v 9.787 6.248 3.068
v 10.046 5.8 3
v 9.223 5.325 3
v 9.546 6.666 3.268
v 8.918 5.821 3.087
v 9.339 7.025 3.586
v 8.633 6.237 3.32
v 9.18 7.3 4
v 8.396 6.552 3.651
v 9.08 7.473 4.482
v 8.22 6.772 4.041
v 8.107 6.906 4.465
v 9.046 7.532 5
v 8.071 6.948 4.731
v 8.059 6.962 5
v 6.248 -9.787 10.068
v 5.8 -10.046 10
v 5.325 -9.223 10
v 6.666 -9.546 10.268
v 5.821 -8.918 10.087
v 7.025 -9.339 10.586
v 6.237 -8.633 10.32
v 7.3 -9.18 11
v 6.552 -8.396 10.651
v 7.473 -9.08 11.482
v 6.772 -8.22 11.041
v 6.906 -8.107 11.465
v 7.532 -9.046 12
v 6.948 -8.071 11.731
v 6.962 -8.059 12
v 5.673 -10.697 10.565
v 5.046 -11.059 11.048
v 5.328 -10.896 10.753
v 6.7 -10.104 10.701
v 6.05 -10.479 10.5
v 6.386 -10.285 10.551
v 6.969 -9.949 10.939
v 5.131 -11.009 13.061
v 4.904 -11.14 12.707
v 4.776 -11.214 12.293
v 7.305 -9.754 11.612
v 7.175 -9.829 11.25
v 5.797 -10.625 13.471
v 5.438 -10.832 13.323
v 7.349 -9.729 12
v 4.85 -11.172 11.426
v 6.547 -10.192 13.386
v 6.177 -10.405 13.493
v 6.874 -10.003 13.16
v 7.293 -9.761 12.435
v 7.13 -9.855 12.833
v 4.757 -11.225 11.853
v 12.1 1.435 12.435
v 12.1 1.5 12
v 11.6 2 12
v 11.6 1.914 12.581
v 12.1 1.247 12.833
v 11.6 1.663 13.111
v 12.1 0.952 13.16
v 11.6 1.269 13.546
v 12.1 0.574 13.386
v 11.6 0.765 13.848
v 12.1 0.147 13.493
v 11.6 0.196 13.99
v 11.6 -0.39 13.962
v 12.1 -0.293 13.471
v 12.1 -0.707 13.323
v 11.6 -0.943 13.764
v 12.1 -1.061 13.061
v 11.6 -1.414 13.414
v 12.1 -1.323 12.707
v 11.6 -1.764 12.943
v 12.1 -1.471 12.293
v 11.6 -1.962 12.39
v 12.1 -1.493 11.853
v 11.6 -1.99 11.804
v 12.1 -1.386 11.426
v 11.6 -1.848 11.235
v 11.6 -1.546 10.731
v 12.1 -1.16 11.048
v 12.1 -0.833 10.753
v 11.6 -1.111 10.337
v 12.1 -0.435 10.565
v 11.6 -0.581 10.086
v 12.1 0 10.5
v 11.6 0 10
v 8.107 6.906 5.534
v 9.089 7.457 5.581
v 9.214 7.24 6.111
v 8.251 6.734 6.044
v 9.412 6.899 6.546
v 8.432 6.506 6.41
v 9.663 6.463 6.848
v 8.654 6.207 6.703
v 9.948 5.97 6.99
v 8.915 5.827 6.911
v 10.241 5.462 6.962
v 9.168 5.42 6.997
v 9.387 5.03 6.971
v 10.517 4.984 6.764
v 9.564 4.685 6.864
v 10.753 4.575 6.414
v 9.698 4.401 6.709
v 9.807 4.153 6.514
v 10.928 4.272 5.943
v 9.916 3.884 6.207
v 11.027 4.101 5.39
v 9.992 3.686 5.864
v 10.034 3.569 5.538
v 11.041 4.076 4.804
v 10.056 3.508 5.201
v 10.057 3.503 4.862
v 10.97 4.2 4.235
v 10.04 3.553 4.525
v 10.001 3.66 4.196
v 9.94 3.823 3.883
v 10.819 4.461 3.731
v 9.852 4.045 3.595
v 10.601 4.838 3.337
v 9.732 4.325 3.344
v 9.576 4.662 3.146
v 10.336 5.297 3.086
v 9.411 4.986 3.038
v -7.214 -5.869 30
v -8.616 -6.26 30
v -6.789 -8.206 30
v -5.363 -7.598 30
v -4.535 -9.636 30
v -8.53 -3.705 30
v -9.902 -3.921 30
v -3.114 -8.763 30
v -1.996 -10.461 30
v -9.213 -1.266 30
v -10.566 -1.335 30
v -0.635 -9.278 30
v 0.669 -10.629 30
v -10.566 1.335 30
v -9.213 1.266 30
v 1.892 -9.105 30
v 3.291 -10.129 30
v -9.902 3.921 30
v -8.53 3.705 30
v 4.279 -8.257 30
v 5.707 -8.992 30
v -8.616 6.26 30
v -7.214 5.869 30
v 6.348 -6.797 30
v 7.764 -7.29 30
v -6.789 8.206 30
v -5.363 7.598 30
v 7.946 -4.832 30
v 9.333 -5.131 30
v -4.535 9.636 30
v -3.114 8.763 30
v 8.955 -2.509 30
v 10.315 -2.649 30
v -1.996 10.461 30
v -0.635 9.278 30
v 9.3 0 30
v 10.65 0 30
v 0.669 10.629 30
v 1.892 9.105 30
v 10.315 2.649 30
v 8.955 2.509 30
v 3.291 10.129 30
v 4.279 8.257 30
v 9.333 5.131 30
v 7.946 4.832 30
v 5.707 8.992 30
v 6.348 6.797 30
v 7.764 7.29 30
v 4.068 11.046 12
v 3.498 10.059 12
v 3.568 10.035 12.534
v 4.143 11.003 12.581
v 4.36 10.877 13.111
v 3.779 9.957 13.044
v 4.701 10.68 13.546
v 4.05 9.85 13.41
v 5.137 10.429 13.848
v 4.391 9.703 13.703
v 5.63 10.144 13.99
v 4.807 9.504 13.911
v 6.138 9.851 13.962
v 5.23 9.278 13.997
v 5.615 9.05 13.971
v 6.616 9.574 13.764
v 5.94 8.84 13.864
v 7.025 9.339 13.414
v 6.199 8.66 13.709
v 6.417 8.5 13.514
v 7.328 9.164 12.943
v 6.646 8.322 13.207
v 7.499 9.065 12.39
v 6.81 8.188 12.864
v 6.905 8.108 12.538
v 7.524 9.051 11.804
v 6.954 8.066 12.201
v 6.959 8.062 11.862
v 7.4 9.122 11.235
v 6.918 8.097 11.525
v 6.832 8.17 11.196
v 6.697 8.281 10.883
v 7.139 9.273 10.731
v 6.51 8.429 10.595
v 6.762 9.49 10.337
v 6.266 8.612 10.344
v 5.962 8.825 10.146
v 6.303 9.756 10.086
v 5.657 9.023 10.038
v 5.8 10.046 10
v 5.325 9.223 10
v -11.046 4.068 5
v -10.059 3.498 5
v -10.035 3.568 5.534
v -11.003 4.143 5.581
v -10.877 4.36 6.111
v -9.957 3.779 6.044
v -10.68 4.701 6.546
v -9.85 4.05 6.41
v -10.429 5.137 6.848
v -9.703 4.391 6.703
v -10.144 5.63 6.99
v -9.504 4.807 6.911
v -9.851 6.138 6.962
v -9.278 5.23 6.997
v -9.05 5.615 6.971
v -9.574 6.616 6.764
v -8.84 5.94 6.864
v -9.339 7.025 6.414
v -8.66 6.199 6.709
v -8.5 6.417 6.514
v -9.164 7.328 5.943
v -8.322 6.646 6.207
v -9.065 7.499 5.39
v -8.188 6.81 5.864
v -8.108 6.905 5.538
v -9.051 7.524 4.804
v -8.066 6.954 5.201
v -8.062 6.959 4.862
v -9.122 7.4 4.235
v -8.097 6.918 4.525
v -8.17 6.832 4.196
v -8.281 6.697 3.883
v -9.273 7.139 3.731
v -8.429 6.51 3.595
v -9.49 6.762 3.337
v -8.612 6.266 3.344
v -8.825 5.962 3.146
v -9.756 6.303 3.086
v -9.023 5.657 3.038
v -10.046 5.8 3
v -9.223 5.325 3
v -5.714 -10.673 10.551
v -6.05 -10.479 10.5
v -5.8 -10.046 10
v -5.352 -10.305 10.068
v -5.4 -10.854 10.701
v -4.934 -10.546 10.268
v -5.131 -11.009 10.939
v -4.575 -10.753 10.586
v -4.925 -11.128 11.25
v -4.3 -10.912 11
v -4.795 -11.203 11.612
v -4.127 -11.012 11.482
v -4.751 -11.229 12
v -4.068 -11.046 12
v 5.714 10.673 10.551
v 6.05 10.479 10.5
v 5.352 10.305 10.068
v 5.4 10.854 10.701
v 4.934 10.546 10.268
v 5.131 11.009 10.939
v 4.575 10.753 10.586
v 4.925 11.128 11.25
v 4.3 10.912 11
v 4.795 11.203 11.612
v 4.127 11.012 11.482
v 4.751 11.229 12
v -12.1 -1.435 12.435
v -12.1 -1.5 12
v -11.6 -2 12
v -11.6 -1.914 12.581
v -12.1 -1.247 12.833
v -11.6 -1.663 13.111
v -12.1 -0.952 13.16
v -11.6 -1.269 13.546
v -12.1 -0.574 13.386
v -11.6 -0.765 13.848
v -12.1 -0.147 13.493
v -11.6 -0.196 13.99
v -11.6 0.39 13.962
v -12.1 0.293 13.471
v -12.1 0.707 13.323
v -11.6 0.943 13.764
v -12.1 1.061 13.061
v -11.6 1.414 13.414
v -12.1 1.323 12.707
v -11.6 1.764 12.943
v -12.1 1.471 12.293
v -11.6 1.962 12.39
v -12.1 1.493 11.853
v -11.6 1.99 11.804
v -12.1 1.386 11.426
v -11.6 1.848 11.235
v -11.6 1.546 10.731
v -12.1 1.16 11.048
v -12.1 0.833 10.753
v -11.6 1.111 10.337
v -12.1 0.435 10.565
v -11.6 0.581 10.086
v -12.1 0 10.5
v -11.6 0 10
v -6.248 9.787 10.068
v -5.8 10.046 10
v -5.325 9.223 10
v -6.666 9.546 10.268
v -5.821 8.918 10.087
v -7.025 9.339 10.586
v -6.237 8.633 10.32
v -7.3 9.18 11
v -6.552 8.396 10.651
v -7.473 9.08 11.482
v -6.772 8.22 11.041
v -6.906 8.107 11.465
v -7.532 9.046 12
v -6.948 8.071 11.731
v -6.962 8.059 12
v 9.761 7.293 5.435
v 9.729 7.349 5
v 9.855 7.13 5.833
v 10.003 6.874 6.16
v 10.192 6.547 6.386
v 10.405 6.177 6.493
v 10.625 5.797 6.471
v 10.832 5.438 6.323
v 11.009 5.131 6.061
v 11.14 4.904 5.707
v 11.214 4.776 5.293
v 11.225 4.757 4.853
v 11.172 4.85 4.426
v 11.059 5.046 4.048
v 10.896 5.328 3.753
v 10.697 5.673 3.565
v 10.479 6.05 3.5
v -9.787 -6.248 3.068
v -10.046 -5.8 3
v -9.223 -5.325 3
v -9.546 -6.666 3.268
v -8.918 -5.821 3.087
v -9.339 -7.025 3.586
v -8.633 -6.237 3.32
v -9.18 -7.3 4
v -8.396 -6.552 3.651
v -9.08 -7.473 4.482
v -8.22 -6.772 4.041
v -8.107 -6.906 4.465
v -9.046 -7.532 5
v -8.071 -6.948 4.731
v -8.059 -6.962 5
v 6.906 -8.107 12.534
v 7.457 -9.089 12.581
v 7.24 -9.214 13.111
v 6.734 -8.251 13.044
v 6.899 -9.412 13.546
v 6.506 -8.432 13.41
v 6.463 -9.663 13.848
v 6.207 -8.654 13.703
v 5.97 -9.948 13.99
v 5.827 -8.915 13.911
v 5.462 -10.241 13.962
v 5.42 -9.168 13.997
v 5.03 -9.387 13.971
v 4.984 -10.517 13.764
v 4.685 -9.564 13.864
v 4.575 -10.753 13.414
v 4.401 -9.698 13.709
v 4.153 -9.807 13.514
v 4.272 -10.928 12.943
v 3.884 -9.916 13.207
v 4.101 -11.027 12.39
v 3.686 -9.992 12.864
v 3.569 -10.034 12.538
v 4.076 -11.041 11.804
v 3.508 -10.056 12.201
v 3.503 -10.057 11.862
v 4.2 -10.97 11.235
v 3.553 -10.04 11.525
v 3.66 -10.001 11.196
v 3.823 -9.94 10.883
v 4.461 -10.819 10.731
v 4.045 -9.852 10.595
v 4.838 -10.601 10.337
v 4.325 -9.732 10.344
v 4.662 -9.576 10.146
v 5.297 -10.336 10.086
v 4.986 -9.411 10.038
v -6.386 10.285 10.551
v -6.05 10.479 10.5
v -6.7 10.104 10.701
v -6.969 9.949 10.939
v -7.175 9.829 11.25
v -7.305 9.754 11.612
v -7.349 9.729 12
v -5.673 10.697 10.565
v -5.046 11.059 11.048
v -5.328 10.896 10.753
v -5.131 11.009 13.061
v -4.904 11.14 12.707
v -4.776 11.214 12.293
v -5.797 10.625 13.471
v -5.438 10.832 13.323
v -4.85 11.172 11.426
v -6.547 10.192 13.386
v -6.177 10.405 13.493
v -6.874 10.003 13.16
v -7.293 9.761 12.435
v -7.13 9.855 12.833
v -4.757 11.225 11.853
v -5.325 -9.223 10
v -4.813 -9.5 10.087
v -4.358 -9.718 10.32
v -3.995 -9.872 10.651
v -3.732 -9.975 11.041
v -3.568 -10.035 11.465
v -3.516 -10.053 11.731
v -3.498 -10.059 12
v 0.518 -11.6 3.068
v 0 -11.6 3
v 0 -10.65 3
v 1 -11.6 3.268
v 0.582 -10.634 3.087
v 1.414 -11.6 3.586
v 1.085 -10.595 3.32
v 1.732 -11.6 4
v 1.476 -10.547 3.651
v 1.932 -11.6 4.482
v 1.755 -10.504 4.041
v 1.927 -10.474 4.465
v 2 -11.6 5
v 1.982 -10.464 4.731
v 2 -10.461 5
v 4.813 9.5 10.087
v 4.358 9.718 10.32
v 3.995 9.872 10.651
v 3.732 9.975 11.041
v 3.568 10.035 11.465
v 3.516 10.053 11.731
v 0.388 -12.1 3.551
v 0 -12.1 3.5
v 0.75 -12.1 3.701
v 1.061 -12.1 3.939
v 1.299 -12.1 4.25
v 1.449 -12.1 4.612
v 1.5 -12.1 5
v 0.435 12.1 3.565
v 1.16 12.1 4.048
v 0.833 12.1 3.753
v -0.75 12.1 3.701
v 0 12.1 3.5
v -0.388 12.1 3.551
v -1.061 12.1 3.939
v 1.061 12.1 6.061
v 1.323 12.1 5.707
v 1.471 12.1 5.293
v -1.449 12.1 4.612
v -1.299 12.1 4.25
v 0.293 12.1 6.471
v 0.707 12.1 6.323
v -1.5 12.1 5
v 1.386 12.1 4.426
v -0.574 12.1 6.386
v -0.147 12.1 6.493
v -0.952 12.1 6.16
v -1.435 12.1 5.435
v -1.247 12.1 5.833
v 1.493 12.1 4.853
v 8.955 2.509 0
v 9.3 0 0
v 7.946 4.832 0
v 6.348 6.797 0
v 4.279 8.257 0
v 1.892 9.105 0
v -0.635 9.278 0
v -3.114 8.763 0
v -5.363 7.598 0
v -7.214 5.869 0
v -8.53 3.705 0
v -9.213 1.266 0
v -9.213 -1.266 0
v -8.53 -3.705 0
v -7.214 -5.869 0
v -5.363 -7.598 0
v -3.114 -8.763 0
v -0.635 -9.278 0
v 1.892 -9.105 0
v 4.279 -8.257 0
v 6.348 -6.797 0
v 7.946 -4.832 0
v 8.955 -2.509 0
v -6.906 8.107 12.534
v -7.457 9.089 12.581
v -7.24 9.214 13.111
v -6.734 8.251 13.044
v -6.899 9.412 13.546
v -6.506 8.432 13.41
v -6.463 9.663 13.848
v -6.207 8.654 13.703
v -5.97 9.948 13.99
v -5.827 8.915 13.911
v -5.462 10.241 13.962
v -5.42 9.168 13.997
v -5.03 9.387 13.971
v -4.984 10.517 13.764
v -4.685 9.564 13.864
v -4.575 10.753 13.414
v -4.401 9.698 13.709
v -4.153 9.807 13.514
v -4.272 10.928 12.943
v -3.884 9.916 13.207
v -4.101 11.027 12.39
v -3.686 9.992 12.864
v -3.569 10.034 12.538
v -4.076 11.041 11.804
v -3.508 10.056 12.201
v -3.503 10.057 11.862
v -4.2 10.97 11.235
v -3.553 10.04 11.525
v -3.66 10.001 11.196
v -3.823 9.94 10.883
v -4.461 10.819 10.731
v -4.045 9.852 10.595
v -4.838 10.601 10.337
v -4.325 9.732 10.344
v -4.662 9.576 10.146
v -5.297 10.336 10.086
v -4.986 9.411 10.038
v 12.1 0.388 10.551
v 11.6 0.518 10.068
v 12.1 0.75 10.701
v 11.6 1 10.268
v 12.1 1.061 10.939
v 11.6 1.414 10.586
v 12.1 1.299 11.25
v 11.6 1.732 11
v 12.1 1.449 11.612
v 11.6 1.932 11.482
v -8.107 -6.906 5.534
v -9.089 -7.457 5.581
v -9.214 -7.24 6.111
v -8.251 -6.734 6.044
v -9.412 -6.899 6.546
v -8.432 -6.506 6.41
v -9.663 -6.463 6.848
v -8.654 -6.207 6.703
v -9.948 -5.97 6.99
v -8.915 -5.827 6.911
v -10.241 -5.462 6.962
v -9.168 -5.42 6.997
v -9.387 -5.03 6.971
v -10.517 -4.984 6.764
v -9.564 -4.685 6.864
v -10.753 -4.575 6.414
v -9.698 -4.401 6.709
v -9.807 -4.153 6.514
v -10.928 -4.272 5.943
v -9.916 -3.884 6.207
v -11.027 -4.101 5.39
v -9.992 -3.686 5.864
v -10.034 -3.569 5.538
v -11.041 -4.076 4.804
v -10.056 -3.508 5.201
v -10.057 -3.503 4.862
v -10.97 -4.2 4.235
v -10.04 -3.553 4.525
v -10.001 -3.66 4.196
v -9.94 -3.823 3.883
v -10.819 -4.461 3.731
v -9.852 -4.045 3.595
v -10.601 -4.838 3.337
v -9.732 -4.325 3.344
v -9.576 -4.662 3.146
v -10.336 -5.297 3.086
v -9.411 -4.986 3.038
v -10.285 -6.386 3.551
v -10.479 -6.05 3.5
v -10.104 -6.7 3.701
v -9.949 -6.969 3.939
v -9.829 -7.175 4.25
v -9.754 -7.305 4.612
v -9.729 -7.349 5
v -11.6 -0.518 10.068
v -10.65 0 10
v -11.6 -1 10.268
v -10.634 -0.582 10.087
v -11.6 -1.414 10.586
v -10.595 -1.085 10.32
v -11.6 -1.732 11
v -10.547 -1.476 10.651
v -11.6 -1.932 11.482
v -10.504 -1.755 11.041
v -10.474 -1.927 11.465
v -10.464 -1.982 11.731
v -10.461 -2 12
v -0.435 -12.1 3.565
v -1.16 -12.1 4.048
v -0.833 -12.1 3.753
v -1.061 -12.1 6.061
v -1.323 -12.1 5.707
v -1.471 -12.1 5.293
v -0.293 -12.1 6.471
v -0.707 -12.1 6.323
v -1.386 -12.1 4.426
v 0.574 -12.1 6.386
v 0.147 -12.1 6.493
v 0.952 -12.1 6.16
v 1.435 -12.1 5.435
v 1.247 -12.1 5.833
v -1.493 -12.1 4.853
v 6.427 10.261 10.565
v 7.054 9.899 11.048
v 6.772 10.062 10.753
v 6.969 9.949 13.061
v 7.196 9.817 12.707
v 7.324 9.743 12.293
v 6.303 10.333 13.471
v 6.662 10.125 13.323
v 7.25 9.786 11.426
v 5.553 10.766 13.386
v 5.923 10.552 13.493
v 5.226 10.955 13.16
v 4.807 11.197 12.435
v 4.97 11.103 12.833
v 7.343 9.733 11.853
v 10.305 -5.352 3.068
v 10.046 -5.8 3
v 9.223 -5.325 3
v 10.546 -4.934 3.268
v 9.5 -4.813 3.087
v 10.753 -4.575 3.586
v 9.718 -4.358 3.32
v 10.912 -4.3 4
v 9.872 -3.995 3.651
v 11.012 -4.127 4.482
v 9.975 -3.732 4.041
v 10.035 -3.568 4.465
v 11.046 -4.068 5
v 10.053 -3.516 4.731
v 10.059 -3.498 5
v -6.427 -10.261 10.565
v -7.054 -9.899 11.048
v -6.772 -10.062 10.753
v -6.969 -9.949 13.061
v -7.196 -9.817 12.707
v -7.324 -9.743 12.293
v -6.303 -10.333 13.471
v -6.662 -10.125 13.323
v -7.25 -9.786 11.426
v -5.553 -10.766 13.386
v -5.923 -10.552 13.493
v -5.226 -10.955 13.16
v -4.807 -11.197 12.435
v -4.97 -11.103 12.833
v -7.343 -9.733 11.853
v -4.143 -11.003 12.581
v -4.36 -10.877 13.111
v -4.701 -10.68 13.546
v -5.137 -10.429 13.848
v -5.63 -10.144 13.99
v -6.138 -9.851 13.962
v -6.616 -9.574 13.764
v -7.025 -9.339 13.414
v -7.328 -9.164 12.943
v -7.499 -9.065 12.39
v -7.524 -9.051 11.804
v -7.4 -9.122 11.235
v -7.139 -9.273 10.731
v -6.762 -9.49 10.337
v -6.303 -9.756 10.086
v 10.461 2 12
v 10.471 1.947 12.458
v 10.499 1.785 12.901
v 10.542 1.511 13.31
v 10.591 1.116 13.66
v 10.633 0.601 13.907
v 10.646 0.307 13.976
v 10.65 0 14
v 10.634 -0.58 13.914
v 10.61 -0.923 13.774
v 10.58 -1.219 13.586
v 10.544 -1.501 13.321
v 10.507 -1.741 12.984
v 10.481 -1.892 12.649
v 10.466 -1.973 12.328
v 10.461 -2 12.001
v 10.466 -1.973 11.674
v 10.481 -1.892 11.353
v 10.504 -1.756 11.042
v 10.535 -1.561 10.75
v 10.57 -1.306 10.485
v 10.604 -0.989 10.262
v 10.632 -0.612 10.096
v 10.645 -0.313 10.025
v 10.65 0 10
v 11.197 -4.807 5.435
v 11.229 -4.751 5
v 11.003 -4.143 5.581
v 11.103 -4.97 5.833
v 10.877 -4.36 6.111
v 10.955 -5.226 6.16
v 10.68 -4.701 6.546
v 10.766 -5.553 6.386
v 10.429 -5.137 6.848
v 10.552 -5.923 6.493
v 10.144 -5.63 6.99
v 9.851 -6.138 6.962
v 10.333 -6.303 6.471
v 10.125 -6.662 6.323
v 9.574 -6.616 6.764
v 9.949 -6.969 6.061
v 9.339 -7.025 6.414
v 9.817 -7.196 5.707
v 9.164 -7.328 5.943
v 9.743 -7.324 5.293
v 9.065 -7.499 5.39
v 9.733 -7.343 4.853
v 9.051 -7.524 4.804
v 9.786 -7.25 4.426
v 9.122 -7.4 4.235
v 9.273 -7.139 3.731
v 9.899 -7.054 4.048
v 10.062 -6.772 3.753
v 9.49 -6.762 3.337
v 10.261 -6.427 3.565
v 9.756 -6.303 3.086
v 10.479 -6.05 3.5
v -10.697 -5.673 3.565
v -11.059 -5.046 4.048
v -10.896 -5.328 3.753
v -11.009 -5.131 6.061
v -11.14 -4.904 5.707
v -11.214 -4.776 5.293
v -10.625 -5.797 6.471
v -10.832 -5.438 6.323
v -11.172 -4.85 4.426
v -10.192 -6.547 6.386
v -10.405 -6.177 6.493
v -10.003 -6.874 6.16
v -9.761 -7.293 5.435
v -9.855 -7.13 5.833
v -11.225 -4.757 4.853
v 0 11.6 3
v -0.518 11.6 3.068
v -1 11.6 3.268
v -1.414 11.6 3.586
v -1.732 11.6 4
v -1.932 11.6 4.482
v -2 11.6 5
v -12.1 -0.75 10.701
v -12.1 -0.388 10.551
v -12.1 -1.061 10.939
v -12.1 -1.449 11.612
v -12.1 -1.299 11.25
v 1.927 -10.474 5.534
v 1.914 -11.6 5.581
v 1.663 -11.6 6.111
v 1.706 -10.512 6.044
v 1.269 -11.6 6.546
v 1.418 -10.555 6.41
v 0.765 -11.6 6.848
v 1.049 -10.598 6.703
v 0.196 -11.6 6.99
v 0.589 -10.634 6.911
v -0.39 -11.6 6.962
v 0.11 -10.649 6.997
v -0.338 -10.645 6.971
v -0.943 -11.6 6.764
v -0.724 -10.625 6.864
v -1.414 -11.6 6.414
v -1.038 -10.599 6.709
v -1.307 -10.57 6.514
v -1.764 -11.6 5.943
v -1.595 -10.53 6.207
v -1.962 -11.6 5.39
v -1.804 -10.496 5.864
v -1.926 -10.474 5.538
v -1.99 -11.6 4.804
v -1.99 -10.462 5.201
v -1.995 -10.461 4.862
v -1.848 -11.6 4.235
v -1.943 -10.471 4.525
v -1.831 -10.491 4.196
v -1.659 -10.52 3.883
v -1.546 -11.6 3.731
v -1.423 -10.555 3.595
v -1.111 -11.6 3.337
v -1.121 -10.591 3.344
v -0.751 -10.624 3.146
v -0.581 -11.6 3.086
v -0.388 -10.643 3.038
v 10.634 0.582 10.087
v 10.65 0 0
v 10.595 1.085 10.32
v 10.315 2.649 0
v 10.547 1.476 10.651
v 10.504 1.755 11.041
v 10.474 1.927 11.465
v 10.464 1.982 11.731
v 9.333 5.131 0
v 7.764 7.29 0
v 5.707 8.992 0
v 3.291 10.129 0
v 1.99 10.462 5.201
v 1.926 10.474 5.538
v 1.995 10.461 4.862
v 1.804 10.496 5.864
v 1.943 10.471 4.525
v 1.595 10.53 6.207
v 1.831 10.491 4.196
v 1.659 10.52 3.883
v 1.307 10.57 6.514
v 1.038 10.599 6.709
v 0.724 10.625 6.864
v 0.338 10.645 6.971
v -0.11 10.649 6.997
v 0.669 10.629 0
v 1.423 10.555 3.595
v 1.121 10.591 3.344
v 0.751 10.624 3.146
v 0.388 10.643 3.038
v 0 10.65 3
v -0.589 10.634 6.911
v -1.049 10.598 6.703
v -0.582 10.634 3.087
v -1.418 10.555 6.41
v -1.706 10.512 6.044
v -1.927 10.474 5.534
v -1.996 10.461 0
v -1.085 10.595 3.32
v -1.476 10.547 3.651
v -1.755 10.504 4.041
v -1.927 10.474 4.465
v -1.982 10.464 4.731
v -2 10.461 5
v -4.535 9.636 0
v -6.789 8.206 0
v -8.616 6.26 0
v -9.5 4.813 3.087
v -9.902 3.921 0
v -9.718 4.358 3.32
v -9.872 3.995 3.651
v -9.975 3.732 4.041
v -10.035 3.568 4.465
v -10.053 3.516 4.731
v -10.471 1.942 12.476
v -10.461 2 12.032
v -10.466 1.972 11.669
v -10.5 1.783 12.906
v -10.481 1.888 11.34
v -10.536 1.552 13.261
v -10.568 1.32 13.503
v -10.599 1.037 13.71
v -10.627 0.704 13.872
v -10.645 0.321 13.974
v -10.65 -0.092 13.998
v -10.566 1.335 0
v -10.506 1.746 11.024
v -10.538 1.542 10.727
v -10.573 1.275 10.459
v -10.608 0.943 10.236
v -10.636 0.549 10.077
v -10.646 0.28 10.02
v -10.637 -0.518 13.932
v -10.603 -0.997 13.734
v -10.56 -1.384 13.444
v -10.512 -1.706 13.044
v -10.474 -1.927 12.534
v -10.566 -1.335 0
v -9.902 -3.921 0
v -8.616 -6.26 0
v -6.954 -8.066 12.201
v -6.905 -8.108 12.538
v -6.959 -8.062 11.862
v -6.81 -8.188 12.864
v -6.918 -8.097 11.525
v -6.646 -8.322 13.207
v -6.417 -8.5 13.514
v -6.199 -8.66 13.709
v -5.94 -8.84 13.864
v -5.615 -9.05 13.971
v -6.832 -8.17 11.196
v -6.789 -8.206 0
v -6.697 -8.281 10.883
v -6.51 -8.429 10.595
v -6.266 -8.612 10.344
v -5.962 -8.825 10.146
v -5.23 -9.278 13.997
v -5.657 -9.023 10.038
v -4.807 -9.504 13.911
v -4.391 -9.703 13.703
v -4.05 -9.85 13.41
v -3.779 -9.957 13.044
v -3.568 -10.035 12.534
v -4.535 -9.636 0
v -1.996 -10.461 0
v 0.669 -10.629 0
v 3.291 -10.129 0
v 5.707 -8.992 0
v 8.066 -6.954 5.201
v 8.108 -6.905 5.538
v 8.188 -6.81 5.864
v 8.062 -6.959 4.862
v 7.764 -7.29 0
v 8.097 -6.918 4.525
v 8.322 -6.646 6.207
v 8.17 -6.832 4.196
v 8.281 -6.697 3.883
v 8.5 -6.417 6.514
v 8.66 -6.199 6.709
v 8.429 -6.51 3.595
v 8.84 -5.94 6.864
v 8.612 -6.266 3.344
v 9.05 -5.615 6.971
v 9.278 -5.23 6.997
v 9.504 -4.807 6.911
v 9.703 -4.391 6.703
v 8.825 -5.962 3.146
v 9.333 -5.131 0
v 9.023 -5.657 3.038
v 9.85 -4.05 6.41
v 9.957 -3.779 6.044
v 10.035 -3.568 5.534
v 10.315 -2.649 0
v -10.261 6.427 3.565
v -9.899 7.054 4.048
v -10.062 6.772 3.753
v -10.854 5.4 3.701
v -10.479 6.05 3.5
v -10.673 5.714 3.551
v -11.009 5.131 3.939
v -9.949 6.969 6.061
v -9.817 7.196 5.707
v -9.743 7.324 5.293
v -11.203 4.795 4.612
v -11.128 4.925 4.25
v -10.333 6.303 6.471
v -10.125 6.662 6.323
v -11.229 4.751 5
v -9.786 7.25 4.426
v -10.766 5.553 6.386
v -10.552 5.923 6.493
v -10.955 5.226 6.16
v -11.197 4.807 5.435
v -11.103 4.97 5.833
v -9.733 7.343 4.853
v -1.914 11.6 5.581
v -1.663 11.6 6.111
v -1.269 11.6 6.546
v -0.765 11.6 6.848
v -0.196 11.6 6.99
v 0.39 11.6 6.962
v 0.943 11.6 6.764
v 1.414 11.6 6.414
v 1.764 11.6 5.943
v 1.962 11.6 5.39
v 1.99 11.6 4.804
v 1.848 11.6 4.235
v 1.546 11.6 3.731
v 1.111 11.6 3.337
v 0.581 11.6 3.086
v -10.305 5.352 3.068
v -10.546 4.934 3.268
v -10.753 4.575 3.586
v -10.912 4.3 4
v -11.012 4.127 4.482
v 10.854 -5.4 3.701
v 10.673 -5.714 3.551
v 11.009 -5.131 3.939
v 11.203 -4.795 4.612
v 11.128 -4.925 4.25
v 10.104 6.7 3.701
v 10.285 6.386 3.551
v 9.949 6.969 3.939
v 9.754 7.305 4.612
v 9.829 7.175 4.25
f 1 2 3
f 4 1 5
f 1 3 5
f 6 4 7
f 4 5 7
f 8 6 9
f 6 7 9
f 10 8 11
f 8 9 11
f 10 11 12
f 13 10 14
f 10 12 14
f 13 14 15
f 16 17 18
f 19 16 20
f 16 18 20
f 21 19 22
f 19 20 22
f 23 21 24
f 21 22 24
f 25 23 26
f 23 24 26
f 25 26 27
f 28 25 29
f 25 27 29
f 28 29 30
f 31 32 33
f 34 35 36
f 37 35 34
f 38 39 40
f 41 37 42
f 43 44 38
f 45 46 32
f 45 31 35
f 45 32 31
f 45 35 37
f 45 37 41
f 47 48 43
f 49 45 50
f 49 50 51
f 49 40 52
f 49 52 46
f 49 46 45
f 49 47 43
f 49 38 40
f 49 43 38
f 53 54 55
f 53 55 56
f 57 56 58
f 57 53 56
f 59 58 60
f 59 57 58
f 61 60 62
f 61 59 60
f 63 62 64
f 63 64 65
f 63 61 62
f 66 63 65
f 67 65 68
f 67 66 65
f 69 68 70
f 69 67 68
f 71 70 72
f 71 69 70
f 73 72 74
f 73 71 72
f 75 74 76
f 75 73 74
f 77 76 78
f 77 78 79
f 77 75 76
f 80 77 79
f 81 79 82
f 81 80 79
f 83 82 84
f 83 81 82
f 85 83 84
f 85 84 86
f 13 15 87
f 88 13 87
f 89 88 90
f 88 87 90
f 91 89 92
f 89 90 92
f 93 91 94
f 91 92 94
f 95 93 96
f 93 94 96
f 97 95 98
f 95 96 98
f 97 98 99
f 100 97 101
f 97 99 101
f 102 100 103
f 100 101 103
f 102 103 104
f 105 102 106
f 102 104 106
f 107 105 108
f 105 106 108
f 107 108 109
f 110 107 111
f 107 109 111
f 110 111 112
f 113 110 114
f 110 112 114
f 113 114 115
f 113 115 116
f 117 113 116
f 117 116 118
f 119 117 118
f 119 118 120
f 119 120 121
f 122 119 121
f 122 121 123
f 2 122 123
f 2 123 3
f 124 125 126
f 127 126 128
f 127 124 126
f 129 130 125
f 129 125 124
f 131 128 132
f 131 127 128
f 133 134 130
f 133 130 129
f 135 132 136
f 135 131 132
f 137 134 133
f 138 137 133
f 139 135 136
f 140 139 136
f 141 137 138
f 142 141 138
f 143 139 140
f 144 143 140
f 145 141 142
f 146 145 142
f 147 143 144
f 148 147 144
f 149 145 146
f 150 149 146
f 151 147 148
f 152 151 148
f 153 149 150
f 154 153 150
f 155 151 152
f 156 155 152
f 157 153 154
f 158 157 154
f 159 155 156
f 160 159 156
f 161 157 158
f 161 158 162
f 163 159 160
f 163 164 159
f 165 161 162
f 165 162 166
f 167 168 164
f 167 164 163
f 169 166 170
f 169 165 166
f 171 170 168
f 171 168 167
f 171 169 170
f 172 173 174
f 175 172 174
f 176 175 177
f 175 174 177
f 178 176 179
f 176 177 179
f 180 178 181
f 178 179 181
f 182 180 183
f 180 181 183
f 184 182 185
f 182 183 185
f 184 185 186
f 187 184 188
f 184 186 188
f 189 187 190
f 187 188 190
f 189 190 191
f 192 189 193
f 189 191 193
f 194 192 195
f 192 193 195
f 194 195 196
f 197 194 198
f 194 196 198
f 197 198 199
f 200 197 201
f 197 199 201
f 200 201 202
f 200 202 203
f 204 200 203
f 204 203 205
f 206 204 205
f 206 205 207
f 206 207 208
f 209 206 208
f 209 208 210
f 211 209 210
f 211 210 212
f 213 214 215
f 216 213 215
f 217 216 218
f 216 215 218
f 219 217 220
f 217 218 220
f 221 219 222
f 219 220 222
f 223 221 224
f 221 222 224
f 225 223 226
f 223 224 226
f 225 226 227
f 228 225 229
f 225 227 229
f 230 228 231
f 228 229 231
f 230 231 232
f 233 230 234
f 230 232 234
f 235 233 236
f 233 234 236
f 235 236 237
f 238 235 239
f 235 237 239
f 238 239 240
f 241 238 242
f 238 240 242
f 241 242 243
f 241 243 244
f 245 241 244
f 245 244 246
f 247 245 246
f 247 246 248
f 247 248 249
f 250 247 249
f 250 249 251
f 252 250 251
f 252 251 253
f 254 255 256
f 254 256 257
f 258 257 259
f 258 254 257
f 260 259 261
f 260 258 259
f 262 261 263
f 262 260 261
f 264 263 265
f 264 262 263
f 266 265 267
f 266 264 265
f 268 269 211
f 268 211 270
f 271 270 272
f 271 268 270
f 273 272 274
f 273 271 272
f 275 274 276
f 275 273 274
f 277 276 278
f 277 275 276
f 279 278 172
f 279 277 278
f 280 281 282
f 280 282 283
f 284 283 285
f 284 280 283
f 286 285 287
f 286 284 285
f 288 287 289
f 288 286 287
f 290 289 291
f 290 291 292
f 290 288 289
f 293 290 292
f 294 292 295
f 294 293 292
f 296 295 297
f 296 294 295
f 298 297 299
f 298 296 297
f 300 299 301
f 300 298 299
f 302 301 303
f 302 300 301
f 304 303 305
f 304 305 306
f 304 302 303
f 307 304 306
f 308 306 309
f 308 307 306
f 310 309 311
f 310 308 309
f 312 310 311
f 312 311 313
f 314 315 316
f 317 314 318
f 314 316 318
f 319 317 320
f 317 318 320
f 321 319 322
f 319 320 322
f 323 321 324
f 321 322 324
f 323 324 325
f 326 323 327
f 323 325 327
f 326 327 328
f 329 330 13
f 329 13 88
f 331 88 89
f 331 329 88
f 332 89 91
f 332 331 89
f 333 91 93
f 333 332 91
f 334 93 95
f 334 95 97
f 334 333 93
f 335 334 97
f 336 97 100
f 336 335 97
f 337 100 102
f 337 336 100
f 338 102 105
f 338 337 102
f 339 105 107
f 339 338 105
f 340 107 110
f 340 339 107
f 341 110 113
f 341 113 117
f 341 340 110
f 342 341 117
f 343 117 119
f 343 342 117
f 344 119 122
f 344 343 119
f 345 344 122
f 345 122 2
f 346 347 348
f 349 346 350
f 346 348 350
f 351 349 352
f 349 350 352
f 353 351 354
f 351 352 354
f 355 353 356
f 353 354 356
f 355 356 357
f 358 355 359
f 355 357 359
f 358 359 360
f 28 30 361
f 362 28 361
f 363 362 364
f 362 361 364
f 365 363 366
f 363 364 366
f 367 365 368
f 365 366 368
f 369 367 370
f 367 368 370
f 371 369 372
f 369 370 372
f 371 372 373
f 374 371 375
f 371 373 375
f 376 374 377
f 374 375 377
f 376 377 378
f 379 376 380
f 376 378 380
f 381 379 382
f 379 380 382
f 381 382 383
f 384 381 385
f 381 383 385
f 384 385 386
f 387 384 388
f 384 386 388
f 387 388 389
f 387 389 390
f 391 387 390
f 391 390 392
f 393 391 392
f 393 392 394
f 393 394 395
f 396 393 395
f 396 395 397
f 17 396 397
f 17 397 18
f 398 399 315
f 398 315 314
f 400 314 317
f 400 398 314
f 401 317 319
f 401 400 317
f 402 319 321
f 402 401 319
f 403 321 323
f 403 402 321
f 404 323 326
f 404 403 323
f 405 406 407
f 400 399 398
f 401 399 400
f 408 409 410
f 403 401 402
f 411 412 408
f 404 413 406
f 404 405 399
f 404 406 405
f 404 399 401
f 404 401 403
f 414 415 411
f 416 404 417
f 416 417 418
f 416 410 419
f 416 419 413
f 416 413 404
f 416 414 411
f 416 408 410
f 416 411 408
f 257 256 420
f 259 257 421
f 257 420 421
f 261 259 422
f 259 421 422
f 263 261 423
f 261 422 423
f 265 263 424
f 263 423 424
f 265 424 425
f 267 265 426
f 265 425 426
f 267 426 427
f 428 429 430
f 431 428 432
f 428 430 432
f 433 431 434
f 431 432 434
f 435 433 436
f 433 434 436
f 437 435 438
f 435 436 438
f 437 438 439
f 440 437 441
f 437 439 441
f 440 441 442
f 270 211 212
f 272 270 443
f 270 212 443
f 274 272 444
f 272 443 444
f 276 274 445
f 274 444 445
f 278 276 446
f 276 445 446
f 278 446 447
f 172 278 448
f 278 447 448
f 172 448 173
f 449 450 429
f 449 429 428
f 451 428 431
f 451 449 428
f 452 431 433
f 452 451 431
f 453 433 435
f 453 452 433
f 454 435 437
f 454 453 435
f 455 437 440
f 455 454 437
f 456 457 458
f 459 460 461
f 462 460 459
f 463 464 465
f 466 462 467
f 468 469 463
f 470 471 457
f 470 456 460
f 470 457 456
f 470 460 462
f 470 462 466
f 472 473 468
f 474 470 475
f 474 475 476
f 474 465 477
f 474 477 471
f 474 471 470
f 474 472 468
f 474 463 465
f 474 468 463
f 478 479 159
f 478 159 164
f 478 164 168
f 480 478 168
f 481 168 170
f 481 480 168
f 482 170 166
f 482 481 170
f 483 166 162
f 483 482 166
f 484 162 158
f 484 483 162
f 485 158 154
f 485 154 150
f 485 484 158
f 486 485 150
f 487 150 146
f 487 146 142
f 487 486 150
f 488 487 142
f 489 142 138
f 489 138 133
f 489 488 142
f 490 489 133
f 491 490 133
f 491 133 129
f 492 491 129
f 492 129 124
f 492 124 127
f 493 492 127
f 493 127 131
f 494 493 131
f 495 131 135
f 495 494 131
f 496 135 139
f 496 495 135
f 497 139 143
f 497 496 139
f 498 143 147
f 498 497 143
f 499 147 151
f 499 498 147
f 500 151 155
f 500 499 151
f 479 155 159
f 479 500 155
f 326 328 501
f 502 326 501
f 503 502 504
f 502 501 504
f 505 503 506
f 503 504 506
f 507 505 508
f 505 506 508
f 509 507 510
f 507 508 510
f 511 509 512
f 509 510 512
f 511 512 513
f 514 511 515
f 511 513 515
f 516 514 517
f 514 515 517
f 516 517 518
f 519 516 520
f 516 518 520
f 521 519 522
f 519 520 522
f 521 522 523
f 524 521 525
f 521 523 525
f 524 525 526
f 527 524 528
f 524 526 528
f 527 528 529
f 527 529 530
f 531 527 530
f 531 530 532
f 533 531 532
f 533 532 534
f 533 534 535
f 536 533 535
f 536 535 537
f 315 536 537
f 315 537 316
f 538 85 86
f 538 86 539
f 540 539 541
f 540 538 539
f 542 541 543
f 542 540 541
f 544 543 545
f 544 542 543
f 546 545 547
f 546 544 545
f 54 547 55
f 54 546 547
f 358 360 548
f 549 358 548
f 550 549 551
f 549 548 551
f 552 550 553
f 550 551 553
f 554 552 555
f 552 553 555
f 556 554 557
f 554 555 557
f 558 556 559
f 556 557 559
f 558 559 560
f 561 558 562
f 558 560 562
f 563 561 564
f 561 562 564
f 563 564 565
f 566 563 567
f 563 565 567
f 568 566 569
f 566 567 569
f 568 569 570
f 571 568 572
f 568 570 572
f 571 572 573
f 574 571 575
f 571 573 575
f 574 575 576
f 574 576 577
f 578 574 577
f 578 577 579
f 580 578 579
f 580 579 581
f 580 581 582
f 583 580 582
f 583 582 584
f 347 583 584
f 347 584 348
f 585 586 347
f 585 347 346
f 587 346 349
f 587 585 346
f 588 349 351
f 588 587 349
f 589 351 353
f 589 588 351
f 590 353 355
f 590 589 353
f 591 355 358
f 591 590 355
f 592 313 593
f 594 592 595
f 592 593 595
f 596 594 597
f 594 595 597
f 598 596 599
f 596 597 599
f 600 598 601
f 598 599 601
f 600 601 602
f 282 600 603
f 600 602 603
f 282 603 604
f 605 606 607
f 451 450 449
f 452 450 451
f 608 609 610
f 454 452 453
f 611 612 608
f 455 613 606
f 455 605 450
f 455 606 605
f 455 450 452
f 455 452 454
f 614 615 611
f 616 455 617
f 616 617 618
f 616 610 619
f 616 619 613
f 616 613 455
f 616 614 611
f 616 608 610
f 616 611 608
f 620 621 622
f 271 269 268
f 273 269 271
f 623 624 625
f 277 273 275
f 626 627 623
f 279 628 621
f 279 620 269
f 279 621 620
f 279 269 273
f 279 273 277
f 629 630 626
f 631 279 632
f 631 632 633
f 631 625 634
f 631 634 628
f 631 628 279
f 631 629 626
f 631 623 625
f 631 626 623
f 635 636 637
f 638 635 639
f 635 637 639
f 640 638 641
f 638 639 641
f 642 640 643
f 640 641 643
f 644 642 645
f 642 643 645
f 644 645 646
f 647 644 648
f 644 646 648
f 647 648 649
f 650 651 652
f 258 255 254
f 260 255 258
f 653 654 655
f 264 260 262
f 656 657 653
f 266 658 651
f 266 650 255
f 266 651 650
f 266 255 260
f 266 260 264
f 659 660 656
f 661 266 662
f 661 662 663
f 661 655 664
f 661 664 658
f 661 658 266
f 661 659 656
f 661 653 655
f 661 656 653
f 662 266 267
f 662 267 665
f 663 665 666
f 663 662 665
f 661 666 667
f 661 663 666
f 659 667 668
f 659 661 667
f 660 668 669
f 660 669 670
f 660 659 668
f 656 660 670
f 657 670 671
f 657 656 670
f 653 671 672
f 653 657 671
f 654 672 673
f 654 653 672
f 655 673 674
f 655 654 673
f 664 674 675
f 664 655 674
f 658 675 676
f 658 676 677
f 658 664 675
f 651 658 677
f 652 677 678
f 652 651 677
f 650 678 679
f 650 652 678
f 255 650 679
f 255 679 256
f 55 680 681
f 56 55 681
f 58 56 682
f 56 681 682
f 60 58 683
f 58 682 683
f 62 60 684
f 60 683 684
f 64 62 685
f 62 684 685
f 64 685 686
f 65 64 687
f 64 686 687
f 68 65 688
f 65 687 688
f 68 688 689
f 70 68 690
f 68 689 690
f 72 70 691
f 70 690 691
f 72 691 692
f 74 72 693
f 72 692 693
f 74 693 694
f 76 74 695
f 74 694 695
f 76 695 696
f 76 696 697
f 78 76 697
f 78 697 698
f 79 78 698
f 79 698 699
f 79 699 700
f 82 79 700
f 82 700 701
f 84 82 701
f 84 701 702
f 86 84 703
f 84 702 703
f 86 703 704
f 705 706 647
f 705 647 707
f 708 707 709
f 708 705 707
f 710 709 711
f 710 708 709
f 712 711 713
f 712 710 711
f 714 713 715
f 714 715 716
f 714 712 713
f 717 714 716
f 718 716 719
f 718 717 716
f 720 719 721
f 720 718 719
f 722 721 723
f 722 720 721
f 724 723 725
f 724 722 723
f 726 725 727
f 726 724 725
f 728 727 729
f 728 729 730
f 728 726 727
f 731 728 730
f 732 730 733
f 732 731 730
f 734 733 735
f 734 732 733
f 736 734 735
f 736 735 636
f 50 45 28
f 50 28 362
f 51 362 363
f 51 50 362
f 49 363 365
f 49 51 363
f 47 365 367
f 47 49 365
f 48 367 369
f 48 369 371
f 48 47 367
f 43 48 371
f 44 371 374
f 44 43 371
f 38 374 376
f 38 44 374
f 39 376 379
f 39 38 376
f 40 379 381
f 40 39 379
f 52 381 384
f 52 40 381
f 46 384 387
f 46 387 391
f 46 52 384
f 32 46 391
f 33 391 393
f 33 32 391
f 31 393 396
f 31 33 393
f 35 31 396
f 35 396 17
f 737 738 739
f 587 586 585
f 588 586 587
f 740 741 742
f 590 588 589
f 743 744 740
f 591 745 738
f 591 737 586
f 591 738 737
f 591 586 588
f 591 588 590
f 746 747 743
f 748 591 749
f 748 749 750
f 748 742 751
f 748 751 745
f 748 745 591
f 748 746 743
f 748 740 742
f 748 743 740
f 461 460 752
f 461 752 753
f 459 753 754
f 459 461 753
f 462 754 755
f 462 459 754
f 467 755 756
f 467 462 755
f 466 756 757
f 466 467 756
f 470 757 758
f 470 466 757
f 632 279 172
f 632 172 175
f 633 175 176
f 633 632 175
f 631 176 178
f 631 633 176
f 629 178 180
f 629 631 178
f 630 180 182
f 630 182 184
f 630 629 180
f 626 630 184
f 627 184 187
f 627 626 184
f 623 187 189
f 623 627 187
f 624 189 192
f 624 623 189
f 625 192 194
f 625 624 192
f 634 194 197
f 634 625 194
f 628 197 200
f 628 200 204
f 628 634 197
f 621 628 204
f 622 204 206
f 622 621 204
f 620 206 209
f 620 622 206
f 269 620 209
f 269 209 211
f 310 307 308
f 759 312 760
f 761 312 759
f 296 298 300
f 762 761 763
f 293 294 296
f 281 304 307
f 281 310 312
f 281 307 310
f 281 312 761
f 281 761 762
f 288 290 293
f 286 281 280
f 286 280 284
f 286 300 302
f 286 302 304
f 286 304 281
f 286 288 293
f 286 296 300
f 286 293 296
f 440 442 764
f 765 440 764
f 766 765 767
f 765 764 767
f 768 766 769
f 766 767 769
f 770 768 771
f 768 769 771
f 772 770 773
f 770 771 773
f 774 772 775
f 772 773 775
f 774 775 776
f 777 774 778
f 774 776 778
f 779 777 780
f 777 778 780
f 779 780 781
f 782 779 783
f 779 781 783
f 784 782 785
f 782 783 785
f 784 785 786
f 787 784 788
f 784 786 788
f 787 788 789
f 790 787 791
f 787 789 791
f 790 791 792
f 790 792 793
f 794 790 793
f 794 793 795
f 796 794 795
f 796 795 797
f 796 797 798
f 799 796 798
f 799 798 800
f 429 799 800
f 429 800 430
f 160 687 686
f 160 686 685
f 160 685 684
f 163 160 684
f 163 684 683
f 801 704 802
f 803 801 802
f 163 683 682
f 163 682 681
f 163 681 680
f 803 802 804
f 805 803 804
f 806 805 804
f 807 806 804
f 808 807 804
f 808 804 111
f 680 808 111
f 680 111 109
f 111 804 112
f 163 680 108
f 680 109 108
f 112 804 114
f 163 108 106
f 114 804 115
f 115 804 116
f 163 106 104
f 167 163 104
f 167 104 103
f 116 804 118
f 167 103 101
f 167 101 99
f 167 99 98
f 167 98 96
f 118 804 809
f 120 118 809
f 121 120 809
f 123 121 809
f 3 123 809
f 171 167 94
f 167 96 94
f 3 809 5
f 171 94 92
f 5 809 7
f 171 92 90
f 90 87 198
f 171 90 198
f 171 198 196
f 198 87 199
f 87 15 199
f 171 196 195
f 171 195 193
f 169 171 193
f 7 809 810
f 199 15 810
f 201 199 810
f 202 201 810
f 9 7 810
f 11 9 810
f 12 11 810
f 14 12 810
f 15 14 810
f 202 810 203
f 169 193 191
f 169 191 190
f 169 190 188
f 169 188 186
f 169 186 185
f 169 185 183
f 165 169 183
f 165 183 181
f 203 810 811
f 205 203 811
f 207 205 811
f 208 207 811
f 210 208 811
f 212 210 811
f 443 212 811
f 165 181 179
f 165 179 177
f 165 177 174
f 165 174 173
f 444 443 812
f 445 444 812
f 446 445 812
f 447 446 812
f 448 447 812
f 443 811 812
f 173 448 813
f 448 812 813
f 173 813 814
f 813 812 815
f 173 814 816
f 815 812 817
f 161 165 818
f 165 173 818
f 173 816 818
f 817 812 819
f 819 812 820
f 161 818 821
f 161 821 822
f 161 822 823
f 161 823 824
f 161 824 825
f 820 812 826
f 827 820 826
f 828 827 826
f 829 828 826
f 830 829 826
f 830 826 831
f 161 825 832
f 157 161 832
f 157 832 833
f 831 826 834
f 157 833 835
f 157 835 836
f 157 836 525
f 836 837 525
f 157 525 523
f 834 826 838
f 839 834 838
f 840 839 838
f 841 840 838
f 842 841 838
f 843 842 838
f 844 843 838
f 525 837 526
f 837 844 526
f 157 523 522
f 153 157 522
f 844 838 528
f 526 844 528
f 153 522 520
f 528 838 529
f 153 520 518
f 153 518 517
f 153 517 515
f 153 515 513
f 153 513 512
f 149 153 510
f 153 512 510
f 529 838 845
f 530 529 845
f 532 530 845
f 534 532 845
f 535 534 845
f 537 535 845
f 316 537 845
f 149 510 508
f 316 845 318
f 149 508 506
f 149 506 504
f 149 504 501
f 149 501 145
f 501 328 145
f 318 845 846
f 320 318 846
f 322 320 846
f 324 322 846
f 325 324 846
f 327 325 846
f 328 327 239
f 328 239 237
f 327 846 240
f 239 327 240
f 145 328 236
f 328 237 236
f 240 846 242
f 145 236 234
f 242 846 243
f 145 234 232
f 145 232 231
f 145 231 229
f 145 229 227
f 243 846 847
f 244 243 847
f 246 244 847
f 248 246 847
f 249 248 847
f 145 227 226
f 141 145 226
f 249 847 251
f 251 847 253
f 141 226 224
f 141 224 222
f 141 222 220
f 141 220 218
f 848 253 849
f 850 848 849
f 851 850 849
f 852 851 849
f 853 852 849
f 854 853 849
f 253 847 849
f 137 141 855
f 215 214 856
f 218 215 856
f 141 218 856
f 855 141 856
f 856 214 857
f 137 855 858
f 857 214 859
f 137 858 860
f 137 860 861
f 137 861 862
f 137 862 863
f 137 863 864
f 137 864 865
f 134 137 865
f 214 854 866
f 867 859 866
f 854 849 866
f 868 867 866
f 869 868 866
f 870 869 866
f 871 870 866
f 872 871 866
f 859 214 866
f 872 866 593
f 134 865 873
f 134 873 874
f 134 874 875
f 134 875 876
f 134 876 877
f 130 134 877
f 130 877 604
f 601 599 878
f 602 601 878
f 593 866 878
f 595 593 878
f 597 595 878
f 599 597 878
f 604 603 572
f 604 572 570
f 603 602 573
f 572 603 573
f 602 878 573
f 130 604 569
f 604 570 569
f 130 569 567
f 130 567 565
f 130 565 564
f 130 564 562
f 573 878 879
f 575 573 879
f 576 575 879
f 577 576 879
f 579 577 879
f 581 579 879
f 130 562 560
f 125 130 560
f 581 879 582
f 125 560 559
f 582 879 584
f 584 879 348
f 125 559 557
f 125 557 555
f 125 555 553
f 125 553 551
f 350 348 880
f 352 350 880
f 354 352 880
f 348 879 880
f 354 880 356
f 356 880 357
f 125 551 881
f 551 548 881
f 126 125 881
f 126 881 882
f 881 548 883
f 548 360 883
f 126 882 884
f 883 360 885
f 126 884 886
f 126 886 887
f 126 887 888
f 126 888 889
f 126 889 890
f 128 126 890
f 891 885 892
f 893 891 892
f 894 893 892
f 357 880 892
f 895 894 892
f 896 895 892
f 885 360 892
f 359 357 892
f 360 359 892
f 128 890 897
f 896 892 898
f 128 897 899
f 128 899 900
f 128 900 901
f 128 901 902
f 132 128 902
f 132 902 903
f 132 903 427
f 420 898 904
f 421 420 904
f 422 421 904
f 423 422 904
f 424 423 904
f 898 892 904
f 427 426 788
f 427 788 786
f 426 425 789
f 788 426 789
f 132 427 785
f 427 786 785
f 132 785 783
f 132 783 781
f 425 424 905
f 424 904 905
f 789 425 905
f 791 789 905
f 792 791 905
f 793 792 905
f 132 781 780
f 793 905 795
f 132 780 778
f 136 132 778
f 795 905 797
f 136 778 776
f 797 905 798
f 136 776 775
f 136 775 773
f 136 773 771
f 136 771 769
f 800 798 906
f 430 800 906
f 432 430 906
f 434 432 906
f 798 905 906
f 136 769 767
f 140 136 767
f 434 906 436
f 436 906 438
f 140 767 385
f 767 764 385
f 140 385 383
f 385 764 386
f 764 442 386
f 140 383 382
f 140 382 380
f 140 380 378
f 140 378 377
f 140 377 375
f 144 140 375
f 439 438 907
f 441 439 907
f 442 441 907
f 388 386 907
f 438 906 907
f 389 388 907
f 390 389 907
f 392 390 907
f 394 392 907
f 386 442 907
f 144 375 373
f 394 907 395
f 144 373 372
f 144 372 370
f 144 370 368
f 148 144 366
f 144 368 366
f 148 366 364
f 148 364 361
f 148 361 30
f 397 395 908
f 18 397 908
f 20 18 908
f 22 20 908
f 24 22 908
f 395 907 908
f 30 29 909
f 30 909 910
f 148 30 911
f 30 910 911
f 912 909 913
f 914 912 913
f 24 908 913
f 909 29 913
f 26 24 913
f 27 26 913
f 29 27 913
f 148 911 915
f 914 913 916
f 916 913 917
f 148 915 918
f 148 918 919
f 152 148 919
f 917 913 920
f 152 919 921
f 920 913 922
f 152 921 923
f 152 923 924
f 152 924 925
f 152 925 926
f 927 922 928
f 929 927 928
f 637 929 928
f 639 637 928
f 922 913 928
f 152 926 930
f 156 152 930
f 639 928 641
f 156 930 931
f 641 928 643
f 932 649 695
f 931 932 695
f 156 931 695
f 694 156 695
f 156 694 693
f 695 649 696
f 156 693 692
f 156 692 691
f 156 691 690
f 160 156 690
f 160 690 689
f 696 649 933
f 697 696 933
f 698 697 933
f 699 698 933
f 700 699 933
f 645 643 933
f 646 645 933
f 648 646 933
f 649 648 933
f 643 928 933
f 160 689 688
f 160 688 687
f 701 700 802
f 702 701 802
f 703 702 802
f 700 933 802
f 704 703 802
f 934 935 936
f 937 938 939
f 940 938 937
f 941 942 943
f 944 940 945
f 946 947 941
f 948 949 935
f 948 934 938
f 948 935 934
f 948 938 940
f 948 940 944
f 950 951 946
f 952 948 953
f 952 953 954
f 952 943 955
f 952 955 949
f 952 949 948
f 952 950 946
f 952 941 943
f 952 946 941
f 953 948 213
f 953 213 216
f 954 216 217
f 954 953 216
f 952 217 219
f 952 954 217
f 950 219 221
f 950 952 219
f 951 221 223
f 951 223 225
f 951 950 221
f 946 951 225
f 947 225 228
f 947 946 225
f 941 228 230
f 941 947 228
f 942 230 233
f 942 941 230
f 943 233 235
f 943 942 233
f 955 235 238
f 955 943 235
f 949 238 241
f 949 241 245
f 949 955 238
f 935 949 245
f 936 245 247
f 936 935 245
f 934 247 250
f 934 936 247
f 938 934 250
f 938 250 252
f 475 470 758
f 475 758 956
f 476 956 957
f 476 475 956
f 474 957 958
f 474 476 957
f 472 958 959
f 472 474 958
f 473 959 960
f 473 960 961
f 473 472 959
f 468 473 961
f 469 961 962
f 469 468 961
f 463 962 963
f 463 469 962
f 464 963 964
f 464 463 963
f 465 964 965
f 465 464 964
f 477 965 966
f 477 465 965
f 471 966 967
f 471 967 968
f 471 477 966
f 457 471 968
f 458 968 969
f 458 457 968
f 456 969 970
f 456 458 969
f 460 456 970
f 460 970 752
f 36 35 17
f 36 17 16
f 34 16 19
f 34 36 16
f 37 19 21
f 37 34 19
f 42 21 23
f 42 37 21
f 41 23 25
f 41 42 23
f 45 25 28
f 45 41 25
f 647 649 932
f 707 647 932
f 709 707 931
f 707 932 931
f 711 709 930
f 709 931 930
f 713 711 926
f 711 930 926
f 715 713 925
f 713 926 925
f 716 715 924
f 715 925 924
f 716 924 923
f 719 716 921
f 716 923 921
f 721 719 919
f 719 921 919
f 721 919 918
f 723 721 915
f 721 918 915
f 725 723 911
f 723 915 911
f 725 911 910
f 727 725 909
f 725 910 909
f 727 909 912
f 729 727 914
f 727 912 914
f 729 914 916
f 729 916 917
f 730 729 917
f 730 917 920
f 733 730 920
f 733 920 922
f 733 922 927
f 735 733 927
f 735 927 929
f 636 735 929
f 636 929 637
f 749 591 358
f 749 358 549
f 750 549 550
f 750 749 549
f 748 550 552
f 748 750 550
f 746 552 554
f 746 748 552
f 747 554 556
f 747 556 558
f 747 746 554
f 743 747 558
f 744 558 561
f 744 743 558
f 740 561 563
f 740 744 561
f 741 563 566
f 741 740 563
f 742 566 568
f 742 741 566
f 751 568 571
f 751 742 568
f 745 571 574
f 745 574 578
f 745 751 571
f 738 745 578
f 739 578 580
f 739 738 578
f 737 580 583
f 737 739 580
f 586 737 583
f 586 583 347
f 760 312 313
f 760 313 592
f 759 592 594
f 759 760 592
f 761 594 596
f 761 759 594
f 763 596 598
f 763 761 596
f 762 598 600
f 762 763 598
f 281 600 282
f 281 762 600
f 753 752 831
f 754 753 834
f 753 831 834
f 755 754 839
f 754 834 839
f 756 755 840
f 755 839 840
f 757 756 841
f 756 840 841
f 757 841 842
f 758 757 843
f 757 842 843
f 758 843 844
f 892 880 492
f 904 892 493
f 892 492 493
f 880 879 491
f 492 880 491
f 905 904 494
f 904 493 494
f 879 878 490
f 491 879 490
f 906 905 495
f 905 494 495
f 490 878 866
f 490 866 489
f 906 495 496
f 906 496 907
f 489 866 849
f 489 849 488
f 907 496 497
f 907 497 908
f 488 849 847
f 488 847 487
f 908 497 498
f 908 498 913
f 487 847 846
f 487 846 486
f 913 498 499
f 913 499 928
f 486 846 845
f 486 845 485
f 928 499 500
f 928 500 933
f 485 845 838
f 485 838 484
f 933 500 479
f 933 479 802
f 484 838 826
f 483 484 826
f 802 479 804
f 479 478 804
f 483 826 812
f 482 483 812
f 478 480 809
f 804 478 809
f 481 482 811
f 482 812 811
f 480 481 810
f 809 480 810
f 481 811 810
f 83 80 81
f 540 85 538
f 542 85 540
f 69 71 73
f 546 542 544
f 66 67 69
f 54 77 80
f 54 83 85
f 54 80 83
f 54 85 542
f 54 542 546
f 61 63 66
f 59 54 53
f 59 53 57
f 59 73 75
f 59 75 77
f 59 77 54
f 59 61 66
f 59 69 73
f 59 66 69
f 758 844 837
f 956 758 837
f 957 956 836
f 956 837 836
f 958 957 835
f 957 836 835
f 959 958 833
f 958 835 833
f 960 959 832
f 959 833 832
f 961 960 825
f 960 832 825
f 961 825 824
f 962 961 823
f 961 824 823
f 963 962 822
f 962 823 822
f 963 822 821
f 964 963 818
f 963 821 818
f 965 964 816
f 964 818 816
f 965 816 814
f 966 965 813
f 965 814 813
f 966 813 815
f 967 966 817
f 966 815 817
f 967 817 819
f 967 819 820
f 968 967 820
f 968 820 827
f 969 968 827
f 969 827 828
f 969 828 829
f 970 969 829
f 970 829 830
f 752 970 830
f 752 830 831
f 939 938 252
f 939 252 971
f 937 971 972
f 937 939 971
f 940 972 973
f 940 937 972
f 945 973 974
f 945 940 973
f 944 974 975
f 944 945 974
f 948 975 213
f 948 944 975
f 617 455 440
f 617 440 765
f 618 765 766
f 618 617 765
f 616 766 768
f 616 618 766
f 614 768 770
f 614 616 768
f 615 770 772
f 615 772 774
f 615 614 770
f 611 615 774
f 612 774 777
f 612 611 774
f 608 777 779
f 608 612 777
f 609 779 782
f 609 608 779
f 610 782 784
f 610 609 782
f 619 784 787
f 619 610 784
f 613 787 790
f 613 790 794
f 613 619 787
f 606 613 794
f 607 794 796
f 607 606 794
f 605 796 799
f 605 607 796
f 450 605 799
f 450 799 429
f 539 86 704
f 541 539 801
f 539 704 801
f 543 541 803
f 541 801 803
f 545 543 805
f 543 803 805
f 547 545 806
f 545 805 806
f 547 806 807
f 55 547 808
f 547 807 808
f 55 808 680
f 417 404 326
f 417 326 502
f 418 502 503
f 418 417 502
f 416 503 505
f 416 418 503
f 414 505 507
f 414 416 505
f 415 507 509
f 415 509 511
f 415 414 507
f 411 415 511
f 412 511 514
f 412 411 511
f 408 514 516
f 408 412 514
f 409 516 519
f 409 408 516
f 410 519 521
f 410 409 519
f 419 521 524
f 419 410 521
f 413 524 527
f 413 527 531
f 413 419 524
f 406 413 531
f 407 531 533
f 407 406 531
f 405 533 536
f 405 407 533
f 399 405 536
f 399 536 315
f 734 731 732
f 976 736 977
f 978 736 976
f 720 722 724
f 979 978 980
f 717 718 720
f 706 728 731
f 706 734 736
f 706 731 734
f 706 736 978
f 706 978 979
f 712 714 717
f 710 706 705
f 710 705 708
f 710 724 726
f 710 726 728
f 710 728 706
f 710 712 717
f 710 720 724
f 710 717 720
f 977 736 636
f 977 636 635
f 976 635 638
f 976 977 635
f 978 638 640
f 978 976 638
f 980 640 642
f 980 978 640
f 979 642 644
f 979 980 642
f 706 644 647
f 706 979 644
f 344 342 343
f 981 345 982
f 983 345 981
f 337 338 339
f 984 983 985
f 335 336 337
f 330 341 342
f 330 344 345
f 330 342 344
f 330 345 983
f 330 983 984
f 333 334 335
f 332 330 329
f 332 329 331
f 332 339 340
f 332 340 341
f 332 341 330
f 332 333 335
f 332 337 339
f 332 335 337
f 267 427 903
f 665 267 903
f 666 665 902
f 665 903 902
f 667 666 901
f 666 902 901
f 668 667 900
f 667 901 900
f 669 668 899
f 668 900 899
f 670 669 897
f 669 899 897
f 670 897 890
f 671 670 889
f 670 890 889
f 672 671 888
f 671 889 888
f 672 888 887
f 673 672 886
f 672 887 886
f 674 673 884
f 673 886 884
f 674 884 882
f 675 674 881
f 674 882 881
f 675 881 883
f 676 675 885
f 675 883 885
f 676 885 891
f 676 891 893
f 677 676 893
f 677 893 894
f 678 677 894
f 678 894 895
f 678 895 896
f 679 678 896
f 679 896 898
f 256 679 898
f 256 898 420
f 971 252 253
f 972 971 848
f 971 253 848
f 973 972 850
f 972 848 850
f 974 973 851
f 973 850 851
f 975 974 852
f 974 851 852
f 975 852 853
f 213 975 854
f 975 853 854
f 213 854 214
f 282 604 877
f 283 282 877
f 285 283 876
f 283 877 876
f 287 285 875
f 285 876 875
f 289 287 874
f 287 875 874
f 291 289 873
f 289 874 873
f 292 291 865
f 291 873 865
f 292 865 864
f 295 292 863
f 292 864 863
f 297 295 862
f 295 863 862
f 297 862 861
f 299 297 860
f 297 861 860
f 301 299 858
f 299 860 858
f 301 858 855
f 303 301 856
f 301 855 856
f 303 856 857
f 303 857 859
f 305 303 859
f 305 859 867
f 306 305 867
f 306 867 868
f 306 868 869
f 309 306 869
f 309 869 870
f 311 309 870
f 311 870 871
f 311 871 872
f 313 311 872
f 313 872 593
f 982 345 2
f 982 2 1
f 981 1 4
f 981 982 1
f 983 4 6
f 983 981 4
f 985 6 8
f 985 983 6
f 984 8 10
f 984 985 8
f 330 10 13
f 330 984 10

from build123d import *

# Parameters (mm, degrees)
F0_R     = 10.65
F0_R_2   = 9.3
F1_DEPTH = 30
F3_DEPTH = 2.5
F4_SIZE  = 0.5
F6_COUNT = 6
F8_ANGLE = 30
F9_COUNT = 6


with BuildPart() as f1:
    # F0 (on Top) → F1 (new body)
    with BuildSketch(Plane.XY):
        Circle(F0_R)
        Circle(F0_R_2, mode=Mode.SUBTRACT)
    extrude(amount=F1_DEPTH)



with BuildPart() as f3:
    # F2 (on Front) → F3 (new body)
    with BuildSketch(Plane.XZ):
        with BuildLine():
            ThreePointArc((0, 3), (1.4142135624, 3.5857864376), (2, 5))
            ThreePointArc((2, 5), (-1.4142135624, 6.4142135624), (0, 3))
        make_face()
    extrude(amount=F3_DEPTH)

    # F4
    f4_edges = [f3.edges().sort_by_distance(p)[0] for p in [
        (0, -2.5, 7),
    ]]
    chamfer(f4_edges, length=F4_SIZE)


with BuildPart() as f3_1:
    # F5: moved
    add(f3.part.moved(Location((0, -9.6, 0))))


with BuildPart() as f6_1:
    # F6: instance of F3
    add(f3_1.part.rotate(Axis((0, 0, 0), (0, 0, -1)), 1 * 360 / F6_COUNT))


with BuildPart() as f6_2:
    # F6: instance of F3
    add(f3_1.part.rotate(Axis((0, 0, 0), (0, 0, -1)), 2 * 360 / F6_COUNT))


with BuildPart() as f6_3:
    # F6: instance of F3
    add(f3_1.part.rotate(Axis((0, 0, 0), (0, 0, -1)), 3 * 360 / F6_COUNT))


with BuildPart() as f6_4:
    # F6: instance of F3
    add(f3_1.part.rotate(Axis((0, 0, 0), (0, 0, -1)), 4 * 360 / F6_COUNT))


with BuildPart() as f6_5:
    # F6: instance of F3
    add(f3_1.part.rotate(Axis((0, 0, 0), (0, 0, -1)), 5 * 360 / F6_COUNT))


with BuildPart() as f7_1:
    # F7: copy of F3
    add(f3_1.part.moved(Location((0, 0, 7))))


with BuildPart() as f7_1_1:
    # F8: moved
    add(f7_1.part.rotate(Axis((0, 0, 0), (0, 0, -1)), F8_ANGLE))


with BuildPart() as f1_1:
    add(f1.part)

    add(f3_1.part)  # F9 merges F3

    add(f6_1.part)  # F9 merges F6_1

    add(f6_2.part)  # F9 merges F6_2

    add(f6_3.part)  # F9 merges F6_3

    add(f6_4.part)  # F9 merges F6_4

    add(f6_5.part)  # F9 merges F6_5

    add(f7_1_1.part)  # F9 merges F7_1
    # F9: F7_1 ×6 about axis
    f9_axis = Axis((0, 0, 0), (0, 0, -1))
    for i in range(1, F9_COUNT):
        add(f7_1_1.part.rotate(f9_axis, i * 360 / F9_COUNT))


solid = f1_1.part
